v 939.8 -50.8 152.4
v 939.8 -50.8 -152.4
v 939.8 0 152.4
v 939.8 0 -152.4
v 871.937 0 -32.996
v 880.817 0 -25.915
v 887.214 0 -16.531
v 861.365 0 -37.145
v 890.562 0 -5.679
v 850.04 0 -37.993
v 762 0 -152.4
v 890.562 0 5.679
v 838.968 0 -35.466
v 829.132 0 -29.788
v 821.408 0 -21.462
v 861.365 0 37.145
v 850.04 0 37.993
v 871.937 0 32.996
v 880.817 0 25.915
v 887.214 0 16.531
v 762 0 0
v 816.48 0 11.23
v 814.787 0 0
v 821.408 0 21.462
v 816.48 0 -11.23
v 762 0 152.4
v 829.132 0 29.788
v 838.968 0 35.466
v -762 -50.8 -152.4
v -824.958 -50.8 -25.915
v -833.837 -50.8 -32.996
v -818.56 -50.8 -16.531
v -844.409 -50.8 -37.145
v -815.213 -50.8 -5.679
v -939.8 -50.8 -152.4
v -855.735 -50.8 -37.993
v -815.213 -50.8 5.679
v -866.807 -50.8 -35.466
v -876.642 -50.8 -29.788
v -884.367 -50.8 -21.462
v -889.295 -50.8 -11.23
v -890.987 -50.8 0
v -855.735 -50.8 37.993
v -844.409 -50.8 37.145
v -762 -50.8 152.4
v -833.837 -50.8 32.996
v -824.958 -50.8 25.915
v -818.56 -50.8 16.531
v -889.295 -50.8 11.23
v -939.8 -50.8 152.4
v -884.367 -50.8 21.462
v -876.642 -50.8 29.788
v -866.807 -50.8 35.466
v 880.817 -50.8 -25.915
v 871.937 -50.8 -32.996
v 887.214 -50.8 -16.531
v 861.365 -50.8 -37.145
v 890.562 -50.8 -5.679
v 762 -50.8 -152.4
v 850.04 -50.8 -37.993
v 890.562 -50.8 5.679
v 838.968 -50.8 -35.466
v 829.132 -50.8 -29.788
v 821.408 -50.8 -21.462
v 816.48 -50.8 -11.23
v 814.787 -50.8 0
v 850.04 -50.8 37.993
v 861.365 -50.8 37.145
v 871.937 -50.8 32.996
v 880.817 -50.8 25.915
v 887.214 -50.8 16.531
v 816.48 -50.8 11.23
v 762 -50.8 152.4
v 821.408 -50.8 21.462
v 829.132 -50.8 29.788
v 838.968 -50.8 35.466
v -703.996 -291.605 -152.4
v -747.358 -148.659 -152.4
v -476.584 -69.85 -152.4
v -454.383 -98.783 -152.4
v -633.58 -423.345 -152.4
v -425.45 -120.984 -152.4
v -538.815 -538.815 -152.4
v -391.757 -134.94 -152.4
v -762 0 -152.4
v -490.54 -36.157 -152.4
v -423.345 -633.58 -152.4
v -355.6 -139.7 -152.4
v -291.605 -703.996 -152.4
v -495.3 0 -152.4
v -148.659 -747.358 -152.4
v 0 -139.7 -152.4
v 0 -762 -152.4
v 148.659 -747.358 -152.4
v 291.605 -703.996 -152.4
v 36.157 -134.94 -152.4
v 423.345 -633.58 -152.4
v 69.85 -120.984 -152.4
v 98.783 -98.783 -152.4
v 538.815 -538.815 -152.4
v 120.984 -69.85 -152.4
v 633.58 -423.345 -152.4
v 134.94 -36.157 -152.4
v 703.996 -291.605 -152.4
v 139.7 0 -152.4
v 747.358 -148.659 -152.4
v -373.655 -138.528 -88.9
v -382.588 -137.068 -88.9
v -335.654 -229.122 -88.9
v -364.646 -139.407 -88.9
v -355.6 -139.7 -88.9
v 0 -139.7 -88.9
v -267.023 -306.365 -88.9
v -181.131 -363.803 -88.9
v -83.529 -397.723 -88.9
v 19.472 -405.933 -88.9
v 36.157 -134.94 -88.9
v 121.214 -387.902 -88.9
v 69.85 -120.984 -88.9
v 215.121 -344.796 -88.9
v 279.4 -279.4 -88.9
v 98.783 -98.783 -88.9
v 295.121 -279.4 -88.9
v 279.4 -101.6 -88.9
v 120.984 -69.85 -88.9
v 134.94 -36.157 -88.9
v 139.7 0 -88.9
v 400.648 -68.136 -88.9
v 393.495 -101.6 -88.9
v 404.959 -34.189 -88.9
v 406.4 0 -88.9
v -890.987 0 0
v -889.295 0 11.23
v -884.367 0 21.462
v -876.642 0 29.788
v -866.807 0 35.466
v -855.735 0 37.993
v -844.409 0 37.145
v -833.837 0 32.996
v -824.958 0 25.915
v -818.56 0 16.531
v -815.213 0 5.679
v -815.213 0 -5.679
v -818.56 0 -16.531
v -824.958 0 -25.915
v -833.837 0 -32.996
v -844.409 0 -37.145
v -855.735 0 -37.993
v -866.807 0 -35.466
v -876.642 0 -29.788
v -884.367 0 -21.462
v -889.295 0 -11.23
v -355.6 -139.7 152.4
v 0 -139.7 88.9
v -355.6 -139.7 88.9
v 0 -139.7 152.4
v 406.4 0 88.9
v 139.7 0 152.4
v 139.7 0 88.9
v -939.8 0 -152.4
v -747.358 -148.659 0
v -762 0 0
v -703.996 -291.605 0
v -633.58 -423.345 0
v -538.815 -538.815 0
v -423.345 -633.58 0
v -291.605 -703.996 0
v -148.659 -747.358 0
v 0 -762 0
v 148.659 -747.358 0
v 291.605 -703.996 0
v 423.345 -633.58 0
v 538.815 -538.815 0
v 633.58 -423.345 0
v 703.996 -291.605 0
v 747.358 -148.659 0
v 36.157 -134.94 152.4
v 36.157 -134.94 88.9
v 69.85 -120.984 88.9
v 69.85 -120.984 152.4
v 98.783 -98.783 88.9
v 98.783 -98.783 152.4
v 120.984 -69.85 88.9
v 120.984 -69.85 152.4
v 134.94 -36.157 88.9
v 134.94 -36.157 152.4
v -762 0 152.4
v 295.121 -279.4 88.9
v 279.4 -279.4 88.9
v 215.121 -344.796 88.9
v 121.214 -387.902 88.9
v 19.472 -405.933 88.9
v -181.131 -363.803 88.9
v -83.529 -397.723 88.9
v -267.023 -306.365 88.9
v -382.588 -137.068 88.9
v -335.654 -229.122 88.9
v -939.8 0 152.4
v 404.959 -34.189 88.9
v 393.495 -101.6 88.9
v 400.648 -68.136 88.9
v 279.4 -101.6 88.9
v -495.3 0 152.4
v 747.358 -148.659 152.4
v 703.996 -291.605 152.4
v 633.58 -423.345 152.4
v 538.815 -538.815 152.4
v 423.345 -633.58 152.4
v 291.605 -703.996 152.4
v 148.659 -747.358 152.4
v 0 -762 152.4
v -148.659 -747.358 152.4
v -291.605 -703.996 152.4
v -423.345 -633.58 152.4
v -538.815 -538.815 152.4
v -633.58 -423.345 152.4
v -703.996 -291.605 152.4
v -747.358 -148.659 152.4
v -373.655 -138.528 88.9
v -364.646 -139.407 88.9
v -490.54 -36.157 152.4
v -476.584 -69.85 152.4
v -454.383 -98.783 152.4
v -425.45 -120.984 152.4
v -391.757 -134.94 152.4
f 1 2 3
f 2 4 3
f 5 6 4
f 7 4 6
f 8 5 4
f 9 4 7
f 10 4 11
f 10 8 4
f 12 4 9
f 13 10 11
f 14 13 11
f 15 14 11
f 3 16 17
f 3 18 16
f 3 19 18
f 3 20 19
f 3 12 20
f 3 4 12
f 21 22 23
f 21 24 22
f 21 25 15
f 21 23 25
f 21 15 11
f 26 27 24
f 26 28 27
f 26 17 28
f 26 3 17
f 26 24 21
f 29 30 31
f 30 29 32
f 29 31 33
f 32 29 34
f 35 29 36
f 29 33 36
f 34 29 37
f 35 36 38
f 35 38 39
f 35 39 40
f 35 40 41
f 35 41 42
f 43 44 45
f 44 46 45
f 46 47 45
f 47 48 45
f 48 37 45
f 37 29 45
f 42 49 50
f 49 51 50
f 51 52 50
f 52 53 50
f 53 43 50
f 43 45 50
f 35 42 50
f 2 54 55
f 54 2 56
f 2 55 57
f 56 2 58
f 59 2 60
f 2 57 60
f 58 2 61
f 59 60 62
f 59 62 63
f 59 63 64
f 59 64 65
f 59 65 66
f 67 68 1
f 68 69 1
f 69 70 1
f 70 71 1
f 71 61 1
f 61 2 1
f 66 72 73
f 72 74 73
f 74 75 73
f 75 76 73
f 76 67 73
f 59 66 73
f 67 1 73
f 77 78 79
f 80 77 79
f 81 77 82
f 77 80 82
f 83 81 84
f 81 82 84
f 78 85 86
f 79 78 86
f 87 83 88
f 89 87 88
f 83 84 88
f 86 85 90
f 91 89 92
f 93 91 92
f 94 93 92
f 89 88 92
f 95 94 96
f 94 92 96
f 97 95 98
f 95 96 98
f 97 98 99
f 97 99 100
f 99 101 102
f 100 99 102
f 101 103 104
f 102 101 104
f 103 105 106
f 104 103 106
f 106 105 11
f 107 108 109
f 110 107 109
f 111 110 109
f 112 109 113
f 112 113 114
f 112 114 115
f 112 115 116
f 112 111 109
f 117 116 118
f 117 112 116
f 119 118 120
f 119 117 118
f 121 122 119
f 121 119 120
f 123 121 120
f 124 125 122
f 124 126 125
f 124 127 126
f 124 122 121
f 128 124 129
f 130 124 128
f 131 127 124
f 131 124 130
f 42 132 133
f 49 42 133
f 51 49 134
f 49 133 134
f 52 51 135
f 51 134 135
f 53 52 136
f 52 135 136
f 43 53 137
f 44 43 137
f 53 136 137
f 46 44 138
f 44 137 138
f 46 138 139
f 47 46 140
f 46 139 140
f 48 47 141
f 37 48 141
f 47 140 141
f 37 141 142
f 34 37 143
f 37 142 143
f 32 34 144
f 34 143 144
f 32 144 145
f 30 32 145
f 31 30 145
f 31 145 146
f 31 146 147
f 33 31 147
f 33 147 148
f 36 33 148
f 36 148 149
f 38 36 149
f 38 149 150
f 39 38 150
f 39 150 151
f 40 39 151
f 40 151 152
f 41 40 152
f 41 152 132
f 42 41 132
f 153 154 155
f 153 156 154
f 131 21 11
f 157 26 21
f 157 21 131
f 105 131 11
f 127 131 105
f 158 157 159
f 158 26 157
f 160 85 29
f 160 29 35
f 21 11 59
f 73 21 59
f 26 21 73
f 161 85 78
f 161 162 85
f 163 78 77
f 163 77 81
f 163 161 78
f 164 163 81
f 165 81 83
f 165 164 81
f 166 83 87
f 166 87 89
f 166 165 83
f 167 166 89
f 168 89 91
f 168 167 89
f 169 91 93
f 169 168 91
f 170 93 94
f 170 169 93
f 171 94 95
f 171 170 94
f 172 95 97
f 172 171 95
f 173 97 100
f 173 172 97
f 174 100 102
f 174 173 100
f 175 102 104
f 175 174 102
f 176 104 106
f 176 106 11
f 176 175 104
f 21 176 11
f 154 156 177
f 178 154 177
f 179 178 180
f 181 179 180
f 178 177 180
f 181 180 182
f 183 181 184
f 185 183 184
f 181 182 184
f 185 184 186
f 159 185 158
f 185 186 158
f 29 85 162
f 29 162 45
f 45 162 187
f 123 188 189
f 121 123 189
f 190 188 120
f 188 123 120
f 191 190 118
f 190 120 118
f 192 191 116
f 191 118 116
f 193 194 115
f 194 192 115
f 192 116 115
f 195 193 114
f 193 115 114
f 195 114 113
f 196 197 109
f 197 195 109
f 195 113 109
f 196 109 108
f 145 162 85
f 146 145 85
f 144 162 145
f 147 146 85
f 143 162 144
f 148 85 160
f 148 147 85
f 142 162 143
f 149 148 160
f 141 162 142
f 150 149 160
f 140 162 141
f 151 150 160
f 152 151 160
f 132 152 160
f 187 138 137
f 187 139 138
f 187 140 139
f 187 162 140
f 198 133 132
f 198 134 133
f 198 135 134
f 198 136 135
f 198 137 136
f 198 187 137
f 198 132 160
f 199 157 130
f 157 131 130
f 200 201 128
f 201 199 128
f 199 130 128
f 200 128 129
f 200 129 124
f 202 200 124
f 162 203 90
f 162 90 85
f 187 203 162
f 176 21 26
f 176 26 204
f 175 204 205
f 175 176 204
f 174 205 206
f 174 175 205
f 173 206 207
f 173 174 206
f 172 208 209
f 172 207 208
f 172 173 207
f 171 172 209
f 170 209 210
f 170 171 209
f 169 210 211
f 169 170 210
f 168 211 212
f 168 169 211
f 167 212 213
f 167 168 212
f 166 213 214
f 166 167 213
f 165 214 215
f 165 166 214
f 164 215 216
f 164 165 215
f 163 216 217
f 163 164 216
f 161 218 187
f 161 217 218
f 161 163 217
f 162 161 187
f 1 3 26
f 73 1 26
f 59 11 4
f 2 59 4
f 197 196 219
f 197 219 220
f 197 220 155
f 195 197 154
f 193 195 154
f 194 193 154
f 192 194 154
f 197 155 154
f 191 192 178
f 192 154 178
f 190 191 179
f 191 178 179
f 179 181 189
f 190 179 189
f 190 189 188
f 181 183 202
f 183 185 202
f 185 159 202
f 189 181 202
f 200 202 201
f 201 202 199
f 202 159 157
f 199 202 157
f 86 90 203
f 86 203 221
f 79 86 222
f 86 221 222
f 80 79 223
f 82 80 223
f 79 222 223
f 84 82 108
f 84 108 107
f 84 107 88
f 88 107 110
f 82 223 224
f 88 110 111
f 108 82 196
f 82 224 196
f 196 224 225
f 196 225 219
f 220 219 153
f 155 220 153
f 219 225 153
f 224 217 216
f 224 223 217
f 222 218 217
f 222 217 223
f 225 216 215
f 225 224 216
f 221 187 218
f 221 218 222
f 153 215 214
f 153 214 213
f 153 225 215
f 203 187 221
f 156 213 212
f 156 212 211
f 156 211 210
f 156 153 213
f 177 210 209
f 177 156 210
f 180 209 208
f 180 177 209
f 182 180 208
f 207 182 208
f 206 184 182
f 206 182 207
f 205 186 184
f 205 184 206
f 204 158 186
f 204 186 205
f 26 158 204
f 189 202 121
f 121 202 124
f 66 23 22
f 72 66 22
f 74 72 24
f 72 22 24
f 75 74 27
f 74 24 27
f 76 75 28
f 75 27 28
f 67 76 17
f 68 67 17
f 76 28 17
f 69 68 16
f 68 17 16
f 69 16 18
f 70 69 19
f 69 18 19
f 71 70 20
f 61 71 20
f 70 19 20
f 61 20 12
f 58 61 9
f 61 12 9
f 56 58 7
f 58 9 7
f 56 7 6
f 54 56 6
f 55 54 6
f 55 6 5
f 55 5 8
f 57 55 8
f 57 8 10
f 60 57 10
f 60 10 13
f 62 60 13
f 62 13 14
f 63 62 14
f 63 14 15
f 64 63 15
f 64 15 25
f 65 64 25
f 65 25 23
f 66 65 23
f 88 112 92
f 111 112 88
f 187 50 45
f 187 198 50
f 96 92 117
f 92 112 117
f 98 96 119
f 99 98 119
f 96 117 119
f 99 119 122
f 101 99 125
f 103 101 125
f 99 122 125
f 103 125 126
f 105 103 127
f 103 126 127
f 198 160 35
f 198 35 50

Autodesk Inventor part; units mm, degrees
ref_plane "YZ Plane" through (0, 0, 0) normal (1, 0, 0) x (0, 1, 0)
ref_plane "XY Plane" through (0, 0, 0) normal (0, 0, 1) x (1, 0, 0)
sketch "Эскиз1" plane through (0, 0, 0) normal (0, 0, 1) x (1, 0, 0)
  circle A0 centre (0, 0) radius 762
  dimension "d0" = 1524
extrude "Выдавливание1" add sketch "Эскиз1" along normal mid plane 304.8
sketch "Эскиз2" plane through (0, 0, 0) normal (0, 0, 1) x (1, 0, 0)
  circle A0 centre (0, 0) radius 406.4
  dimension "d3" = 812.8
extrude "Выдавливание2" cut sketch "Эскиз2" along normal mid plane 177.8
ref_plane "РабПлоскость1" through (0, -101.6, 0) normal (0, 1, 0) x (-1, 0, 0)
sketch "Эскиз3" plane through (0, -101.6, 0) normal (0, 1, 0) x (-1, 0, 0)
  line L0 (406.4, 88.9) -> (-406.4, 88.9) projected
  line L1 (-406.4, -88.9) -> (406.4, -88.9) projected
  line L2 (-406.4, 88.9) -> (-279.4, 88.9)
  line L3 (-279.4, 88.9) -> (-279.4, -88.9)
  line L4 (-279.4, -88.9) -> (-406.4, -88.9)
  line L5 (-406.4, -88.9) -> (-406.4, 88.9)
  point P0 (0, 0)
  dimension "d7" = 127
extrude "Выдавливание3" add sketch "Эскиз3" against normal blind 177.8
sketch "Эскиз4" plane through (0, 0, 152.4) normal (0, 0, 1) x (1, 0, 0)
  line L0 (0, 0) -> (-355.6, 0) construction
  line L1 (0, -139.7) -> (-355.6, -139.7)
  line L2 (-355.6, 139.7) -> (0, 139.7)
  arc A0 (0, -139.7) -> (0, 139.7) centre (0, 0) ccw
  arc A1 (-355.6, 139.7) -> (-355.6, -139.7) centre (-355.6, 0) ccw
  point P0 (-177.8, 0)
  dimension "d10" = 355.6
  dimension "d11" = 279.4
extrude "Выдавливание4" cut sketch "Эскиз4" against normal through all
sketch "Эскиз5" plane through (0, 0, 0) normal (0, 1, 0) x (-1, 0, 0)
  line L0 (762, 152.4) -> (-762, 152.4) projected
  line L1 (-762, -152.4) -> (762, -152.4) projected
  line L2 (762, 152.4) -> (-762, 152.4)
  line L3 (-762, 152.4) -> (-762, -152.4)
  line L4 (-762, -152.4) -> (762, -152.4)
  line L5 (762, -152.4) -> (762, 152.4)
  point P0 (0, 0)
extrude "Выдавливание5" cut sketch "Эскиз5" along normal blind 762
sketch "Эскиз6" plane through (0, 0, 0) normal (0, 1, 0) x (-1, 0, 0)
  line L0 (-762, -152.4) -> (-762, 152.4) projected
  line L1 (-762, -152.4) -> (-939.8, -152.4)
  line L2 (-939.8, -152.4) -> (-939.8, 152.4)
  line L3 (-939.8, 152.4) -> (-762, 152.4)
  line L4 (-762, 152.4) -> (-762, -152.4)
  line L5 (0, 447.1525) -> (0, -527.7865)
  line L6 (-762, 152.4) -> (-139.7, 152.4) projected
  line L7 (-139.7, -152.4) -> (-762, -152.4) projected
  line L8 (762, -152.4) -> (762, 152.4)
  line L9 (762, -152.4) -> (939.8, -152.4)
  line L10 (939.8, -152.4) -> (939.8, 152.4)
  line L11 (939.8, 152.4) -> (762, 152.4)
  point P0 (0, 0)
  dimension "d16" = 304.8
  dimension "d17" = 177.8
extrude "Выдавливание6" add sketch "Эскиз6" against normal blind 50.8
sketch "Эскиз7" plane through (0, -101.6, 0) normal (0, 1, 0) x (-1, 0, 0)
  point P0 (0, 0)
sketch "Эскиз8" plane through (0, 0, 0) normal (0, 1, 0) x (-1, 0, 0)
  circle A0 centre (852.8874, 0) radius 38.1
  line L0 (0, 193.2199) -> (0, -225.4232)
  circle A1 centre (-852.8874, 0) radius 38.1
  point P0 (0, 0)
  dimension "d20" = 76.2
extrude "Выдавливание7" cut sketch "Эскиз8" against normal through all
